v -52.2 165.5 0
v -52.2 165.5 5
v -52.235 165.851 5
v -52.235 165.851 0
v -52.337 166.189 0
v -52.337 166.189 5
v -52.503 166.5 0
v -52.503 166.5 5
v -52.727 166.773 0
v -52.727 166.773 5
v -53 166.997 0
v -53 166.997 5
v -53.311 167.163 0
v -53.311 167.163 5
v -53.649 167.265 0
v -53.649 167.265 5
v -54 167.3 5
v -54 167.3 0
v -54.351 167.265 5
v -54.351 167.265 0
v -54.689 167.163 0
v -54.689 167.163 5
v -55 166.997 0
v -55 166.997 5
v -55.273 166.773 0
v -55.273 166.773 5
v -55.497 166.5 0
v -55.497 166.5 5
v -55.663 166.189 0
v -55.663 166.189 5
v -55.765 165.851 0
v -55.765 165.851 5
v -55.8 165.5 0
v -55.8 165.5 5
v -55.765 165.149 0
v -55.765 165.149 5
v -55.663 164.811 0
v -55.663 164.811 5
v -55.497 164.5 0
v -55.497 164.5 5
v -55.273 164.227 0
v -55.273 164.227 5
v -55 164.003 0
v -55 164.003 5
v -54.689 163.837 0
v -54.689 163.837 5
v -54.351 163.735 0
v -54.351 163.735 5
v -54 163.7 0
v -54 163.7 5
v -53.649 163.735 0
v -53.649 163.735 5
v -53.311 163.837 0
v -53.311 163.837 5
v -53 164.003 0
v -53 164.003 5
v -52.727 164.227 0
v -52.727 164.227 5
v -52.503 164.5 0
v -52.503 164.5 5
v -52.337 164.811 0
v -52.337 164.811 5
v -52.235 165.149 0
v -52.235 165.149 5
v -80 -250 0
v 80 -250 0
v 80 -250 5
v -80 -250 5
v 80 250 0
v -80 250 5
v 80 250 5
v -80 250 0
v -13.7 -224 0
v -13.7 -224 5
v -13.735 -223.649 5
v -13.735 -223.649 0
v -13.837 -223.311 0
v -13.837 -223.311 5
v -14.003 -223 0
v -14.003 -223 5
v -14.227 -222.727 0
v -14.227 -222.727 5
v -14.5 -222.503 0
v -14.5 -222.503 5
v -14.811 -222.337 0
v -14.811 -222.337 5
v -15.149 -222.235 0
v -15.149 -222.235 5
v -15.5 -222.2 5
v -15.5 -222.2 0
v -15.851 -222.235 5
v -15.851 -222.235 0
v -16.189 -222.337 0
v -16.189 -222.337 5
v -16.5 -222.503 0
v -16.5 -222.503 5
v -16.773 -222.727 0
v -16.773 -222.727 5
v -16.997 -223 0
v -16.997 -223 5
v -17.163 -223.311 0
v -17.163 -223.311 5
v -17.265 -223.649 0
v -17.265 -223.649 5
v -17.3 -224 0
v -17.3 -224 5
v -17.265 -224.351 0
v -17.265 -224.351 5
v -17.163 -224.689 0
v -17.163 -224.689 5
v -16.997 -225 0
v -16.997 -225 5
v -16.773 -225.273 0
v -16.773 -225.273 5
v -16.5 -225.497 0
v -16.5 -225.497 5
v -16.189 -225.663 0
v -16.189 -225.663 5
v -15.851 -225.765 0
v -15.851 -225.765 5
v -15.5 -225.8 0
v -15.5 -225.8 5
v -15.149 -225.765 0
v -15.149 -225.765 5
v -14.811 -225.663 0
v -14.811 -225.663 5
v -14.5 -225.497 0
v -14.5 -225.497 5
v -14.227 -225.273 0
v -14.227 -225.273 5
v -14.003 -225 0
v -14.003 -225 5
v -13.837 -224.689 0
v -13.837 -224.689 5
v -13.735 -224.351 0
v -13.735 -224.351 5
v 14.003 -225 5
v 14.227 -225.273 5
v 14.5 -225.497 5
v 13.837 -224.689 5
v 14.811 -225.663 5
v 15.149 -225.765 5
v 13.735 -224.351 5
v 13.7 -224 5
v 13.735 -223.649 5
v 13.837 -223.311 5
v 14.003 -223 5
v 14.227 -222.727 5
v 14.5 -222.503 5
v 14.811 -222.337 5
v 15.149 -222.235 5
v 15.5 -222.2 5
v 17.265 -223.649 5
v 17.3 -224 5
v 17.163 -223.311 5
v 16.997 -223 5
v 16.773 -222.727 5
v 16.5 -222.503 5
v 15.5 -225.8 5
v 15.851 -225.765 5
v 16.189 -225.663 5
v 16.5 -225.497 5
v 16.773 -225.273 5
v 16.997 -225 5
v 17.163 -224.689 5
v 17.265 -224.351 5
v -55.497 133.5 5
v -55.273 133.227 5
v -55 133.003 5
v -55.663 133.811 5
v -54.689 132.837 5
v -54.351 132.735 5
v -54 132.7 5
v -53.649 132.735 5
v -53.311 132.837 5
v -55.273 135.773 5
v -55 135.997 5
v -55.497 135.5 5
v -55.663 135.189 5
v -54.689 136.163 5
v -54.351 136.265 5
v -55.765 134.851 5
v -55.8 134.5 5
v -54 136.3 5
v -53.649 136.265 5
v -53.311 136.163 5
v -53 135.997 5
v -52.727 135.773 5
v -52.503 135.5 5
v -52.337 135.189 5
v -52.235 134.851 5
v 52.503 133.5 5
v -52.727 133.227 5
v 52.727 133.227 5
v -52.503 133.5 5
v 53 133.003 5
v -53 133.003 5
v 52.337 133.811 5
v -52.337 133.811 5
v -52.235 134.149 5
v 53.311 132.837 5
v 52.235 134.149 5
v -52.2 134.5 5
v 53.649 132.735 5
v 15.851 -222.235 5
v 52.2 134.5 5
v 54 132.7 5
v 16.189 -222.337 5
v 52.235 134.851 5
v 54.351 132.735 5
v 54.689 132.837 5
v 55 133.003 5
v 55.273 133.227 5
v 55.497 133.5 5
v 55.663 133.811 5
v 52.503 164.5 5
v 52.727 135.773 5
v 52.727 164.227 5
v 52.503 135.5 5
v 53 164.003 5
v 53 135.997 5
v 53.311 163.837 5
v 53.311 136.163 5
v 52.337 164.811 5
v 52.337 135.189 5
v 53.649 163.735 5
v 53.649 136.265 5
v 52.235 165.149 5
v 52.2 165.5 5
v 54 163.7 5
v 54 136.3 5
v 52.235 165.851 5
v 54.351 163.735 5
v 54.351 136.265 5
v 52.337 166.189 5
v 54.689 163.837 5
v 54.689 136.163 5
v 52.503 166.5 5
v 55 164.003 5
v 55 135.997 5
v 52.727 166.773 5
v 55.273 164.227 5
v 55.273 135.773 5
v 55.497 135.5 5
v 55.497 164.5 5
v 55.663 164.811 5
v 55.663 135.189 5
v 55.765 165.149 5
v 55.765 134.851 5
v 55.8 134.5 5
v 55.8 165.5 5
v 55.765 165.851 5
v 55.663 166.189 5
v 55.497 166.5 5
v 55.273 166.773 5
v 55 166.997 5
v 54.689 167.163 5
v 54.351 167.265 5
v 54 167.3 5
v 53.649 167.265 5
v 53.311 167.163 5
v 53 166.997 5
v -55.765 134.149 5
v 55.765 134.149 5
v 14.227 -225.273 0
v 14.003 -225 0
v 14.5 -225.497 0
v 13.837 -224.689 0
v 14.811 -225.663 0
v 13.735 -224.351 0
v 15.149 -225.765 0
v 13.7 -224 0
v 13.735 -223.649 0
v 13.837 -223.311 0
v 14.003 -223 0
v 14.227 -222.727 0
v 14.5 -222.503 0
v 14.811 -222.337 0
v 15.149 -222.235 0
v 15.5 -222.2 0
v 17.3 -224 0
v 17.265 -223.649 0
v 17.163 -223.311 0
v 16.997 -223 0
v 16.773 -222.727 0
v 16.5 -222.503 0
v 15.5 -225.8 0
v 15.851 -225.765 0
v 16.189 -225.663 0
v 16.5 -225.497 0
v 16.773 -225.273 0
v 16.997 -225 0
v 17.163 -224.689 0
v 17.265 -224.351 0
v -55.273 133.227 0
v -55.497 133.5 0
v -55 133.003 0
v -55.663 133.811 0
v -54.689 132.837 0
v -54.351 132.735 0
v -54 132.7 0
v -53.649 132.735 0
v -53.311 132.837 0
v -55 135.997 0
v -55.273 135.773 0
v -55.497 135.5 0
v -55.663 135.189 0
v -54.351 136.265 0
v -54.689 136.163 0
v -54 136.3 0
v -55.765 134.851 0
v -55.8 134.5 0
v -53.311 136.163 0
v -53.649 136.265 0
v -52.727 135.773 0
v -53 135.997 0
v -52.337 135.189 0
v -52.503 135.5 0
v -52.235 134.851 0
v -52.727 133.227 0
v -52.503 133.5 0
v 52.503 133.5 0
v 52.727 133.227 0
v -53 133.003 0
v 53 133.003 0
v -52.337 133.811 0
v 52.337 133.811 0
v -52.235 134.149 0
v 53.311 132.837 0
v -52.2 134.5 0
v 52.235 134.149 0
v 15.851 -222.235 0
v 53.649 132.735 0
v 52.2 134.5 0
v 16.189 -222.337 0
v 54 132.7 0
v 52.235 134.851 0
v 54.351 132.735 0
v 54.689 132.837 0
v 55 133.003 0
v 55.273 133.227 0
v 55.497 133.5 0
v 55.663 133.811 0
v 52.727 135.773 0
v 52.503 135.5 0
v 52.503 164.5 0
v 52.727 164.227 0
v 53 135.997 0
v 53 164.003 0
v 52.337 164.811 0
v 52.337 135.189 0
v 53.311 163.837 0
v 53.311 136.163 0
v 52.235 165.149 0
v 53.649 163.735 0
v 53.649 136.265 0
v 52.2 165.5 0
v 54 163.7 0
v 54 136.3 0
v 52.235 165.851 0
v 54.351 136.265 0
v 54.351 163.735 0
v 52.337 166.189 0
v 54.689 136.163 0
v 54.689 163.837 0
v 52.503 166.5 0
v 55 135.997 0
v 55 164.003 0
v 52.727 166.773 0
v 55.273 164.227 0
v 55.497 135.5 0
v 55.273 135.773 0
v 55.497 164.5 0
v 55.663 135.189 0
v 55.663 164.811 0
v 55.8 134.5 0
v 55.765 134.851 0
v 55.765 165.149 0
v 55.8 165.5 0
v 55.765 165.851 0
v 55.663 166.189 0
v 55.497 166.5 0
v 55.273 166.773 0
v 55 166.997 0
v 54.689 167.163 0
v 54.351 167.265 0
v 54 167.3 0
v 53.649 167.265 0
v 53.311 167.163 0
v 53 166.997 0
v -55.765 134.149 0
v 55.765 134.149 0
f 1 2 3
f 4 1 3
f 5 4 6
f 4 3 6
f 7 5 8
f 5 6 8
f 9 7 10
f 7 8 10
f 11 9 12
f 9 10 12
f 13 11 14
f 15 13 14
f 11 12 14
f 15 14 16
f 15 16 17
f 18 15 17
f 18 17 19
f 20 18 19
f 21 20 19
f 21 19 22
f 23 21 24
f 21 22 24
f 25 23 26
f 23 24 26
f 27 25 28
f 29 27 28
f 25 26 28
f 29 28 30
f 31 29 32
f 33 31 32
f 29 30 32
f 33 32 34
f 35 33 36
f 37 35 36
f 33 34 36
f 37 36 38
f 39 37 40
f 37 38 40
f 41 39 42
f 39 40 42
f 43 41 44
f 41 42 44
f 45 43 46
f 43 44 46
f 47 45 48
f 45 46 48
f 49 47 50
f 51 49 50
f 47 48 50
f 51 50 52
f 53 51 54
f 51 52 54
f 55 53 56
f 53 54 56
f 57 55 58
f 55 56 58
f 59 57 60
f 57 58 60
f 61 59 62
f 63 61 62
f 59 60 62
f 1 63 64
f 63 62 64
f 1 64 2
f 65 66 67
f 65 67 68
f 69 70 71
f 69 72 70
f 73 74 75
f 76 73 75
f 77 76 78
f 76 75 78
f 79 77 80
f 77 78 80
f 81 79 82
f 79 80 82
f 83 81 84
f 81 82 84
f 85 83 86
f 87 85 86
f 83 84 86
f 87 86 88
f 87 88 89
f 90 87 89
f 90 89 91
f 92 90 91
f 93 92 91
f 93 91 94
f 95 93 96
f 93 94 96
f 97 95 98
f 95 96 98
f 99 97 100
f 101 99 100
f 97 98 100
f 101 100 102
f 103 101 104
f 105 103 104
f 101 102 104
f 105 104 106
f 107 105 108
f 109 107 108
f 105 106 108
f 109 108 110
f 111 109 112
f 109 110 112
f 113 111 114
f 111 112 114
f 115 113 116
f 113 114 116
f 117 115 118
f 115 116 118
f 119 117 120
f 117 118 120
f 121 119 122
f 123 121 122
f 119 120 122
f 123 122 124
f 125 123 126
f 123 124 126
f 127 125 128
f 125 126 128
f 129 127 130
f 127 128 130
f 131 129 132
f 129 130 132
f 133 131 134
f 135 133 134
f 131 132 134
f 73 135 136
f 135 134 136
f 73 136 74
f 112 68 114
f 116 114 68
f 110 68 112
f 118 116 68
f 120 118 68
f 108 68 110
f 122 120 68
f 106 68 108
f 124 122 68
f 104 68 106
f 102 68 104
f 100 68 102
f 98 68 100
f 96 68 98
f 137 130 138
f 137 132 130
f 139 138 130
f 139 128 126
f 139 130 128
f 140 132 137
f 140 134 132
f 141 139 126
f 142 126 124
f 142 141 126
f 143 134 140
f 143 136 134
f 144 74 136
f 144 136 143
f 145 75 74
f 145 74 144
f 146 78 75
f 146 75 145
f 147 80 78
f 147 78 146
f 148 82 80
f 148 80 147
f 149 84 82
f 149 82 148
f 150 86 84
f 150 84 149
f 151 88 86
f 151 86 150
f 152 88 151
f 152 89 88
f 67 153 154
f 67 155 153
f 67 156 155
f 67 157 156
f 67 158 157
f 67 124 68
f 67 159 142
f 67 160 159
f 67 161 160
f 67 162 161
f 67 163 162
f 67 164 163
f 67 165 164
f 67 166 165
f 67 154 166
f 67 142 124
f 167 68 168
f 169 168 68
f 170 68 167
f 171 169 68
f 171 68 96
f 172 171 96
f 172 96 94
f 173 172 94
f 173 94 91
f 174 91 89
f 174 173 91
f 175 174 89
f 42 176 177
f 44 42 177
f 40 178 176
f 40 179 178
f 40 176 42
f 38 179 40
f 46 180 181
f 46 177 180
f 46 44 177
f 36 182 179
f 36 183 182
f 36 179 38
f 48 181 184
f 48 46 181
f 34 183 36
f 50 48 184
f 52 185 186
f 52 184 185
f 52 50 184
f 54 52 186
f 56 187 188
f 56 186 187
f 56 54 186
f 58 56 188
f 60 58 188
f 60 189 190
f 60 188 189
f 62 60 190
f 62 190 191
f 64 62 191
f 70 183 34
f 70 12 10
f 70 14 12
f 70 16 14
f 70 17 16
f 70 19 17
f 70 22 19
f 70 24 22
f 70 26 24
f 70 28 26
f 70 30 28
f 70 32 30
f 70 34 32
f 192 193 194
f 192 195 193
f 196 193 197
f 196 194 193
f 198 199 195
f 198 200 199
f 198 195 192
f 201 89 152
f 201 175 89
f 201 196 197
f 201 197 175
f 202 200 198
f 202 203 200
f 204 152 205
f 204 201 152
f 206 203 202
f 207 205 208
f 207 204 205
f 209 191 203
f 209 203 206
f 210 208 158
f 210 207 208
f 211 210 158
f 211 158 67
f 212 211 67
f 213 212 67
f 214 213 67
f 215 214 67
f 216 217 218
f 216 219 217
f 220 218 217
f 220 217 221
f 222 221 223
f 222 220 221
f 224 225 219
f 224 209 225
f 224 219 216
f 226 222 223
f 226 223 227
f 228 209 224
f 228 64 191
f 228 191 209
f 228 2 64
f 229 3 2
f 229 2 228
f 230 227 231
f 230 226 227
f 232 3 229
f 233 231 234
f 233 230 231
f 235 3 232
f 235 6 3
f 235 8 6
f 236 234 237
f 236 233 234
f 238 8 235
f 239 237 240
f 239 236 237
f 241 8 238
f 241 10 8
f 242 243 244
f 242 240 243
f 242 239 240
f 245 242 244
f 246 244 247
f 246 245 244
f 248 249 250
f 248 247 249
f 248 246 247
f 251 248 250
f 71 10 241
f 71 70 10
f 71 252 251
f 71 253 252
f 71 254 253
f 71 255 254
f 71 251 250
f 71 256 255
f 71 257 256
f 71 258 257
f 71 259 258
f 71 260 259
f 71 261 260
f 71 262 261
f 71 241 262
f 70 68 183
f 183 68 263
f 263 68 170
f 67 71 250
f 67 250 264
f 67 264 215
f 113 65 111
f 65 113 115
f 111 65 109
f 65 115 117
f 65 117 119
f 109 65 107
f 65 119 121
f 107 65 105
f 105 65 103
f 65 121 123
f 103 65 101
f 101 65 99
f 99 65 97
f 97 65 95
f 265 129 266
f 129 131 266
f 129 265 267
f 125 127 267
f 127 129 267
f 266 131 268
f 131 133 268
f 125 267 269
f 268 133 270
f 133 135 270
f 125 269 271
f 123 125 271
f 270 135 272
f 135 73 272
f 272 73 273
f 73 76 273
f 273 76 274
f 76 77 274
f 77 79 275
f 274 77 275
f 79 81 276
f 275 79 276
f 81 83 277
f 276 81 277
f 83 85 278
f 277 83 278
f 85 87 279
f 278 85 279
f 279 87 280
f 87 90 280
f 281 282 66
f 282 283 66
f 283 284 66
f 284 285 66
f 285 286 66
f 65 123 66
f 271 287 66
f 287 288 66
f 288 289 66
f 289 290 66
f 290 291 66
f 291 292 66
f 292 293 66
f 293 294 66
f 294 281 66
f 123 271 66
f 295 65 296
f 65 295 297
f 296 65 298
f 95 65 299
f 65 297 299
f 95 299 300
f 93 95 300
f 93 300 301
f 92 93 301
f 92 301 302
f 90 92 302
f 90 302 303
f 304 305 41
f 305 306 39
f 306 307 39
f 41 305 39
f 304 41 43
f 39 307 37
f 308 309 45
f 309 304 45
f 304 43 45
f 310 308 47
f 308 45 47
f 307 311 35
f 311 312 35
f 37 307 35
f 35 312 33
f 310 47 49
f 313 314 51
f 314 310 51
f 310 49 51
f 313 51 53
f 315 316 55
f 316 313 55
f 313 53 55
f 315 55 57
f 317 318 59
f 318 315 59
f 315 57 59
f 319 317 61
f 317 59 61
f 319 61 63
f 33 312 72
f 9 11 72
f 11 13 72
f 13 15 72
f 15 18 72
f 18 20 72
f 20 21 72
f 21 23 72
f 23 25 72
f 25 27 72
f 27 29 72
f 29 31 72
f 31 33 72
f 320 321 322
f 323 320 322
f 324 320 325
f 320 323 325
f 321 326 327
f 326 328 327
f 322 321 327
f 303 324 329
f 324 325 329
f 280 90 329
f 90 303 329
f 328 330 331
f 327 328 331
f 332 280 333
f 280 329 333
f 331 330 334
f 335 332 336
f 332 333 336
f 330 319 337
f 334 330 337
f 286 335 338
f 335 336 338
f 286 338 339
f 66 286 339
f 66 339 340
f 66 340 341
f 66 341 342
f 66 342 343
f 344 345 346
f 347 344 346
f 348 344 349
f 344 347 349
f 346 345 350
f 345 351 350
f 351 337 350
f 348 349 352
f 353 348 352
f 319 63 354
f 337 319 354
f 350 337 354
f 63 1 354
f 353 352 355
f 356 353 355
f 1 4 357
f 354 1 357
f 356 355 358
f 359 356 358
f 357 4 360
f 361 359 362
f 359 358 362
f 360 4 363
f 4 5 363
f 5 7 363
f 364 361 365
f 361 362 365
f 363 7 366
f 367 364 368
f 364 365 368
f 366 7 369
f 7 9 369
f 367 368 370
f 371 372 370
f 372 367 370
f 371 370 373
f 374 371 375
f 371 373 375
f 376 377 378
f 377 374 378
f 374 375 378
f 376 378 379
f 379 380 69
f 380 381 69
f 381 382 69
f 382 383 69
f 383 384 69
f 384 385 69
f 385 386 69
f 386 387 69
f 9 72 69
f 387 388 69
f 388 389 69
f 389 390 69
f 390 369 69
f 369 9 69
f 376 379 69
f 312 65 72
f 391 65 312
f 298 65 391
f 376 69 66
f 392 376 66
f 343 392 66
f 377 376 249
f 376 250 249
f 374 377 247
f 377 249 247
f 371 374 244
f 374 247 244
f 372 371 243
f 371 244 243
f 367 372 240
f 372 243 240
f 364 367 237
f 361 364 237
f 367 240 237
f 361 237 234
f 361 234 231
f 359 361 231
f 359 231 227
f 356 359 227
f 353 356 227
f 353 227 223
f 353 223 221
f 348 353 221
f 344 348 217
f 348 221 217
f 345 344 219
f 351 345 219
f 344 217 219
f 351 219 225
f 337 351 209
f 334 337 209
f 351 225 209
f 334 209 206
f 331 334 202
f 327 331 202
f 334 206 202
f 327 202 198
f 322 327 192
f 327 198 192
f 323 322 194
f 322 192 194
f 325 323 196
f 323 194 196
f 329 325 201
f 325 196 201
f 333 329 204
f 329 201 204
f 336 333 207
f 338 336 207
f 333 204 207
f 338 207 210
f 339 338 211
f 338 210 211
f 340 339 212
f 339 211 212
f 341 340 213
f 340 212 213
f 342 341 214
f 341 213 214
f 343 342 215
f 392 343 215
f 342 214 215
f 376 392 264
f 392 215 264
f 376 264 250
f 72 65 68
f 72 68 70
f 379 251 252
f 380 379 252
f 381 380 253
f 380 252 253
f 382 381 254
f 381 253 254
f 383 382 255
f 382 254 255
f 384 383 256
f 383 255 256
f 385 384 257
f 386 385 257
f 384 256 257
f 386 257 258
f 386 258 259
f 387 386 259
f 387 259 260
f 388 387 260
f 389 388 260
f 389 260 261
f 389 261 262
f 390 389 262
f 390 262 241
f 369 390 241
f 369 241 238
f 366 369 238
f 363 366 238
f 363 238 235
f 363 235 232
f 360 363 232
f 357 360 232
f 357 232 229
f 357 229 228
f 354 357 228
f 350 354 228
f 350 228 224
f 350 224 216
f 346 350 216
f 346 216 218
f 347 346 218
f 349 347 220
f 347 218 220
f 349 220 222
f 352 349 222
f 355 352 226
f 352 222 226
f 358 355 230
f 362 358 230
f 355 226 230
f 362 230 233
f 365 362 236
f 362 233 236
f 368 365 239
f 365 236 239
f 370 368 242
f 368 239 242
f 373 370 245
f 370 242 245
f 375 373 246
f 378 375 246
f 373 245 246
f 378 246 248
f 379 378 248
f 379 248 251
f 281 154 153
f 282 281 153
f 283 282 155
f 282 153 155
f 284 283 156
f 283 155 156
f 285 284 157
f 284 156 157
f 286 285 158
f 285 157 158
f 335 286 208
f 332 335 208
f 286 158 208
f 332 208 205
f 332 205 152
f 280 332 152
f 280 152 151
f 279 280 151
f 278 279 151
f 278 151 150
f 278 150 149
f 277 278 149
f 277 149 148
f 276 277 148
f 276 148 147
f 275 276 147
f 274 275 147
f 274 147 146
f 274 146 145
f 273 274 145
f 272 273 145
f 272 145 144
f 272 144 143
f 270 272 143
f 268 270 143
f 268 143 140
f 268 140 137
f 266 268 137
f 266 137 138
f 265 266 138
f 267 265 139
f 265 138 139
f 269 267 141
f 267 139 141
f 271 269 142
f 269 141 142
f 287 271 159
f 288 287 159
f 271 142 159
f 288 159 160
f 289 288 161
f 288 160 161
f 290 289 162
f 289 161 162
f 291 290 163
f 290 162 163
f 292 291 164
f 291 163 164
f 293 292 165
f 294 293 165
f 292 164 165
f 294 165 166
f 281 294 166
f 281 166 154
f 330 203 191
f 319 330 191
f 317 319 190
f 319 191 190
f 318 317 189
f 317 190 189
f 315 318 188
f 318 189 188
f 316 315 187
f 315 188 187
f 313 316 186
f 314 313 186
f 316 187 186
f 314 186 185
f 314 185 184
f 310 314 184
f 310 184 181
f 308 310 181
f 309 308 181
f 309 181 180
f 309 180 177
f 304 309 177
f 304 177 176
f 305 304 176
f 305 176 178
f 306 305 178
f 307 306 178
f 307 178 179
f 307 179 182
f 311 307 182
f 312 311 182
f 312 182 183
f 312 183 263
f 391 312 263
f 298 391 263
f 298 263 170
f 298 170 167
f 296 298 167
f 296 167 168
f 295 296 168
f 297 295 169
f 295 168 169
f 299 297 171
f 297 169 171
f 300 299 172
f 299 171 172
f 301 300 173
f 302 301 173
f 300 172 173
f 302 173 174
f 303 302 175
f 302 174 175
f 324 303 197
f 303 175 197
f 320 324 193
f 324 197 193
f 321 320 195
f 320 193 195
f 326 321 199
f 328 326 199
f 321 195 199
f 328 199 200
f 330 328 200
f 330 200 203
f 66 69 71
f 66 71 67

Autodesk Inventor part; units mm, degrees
ref_plane "YZ Plane" through (0, 0, 0) normal (1, 0, 0) x (0, 1, 0)
ref_plane "XZ Plane" through (0, 0, 0) normal (0, 1, 0) x (-1, 0, 0)
ref_plane "XY Plane" through (0, 0, 0) normal (0, 0, 1) x (1, 0, 0)
sketch "草图16" plane through (0, 0, 0) normal (0, 0, 1) x (1, 0, 0)
  line L0 (-80, 250) -> (80, 250)
  line L1 (80, 250) -> (80, -250)
  line L2 (80, -250) -> (-80, -250)
  line L3 (-80, -250) -> (-80, 250)
  point P0 (0, 0)
  dimension "d46" = 160
  dimension "d47" = 500
extrude "拉伸16" add sketch "草图16" along normal blind 5
sketch "草图17" plane through (0, 0, 5) normal (0, 0, 1) x (1, 0, 0)
  circle A0 centre (15.5, -224) radius 1.8
  point P0 (0, 0)
  dimension "d50" = 3.6
extrude "拉伸17" cut sketch "草图17" against normal through all
sketch "草图18" plane through (0, 0, 5) normal (0, 0, 1) x (1, 0, 0)
  circle A0 centre (-15.5, -224) radius 1.8
  point P0 (0, 0)
  dimension "d53" = 3.6
extrude "拉伸18" cut sketch "草图18" against normal through all
sketch "草图23" plane through (0, 0, 5) normal (0, 0, 1) x (1, 0, 0)
  point P0 (0, 0)
sketch "草图24" plane through (0, 0, 5) normal (0, 0, 1) x (1, 0, 0)
  point P0 (0, 0)
sketch "草图25" plane through (0, 0, 5) normal (0, 0, 1) x (1, 0, 0)
  circle A0 centre (54, 165.5) radius 1.8
  point P0 (0, 0)
  dimension "d68" = 3.6
extrude "拉伸23" cut sketch "草图25" against normal through all
sketch "草图26" plane through (0, 0, 5) normal (0, 0, 1) x (1, 0, 0)
  circle A0 centre (54, 134.5) radius 1.8
  point P0 (0, 0)
  dimension "d71" = 3.6
extrude "拉伸24" cut sketch "草图26" against normal through all
sketch "草图27" plane through (0, 0, 5) normal (0, 0, 1) x (1, 0, 0)
  circle A0 centre (-54, 165.5) radius 1.8
  point P0 (0, 0)
  dimension "d74" = 3.6
extrude "拉伸25" cut sketch "草图27" against normal through all
sketch "草图28" plane through (0, 0, 5) normal (0, 0, 1) x (1, 0, 0)
  circle A0 centre (-54, 134.5) radius 1.8
  point P0 (0, 0)
  dimension "d77" = 3.6
extrude "拉伸26" cut sketch "草图28" against normal through all
equation "\"折弯半径\" = 厚度"
equation "\"折弯释压宽度\" = 厚度"
equation "\"折弯释压深度\" = 0.5 * 厚度"
equation "\"拐角释压尺寸\" = 4 * 厚度"
equation "\"最小余量\" = 2 * 厚度"
equation "\"过渡半径\" = 折弯半径"
equation "\"Jacobi半径尺寸\" = 折弯半径"
equation "\"间隙大小\" = 厚度"
equation "\"厚度\" = 0.5"
properties part number "内层16cm板"
